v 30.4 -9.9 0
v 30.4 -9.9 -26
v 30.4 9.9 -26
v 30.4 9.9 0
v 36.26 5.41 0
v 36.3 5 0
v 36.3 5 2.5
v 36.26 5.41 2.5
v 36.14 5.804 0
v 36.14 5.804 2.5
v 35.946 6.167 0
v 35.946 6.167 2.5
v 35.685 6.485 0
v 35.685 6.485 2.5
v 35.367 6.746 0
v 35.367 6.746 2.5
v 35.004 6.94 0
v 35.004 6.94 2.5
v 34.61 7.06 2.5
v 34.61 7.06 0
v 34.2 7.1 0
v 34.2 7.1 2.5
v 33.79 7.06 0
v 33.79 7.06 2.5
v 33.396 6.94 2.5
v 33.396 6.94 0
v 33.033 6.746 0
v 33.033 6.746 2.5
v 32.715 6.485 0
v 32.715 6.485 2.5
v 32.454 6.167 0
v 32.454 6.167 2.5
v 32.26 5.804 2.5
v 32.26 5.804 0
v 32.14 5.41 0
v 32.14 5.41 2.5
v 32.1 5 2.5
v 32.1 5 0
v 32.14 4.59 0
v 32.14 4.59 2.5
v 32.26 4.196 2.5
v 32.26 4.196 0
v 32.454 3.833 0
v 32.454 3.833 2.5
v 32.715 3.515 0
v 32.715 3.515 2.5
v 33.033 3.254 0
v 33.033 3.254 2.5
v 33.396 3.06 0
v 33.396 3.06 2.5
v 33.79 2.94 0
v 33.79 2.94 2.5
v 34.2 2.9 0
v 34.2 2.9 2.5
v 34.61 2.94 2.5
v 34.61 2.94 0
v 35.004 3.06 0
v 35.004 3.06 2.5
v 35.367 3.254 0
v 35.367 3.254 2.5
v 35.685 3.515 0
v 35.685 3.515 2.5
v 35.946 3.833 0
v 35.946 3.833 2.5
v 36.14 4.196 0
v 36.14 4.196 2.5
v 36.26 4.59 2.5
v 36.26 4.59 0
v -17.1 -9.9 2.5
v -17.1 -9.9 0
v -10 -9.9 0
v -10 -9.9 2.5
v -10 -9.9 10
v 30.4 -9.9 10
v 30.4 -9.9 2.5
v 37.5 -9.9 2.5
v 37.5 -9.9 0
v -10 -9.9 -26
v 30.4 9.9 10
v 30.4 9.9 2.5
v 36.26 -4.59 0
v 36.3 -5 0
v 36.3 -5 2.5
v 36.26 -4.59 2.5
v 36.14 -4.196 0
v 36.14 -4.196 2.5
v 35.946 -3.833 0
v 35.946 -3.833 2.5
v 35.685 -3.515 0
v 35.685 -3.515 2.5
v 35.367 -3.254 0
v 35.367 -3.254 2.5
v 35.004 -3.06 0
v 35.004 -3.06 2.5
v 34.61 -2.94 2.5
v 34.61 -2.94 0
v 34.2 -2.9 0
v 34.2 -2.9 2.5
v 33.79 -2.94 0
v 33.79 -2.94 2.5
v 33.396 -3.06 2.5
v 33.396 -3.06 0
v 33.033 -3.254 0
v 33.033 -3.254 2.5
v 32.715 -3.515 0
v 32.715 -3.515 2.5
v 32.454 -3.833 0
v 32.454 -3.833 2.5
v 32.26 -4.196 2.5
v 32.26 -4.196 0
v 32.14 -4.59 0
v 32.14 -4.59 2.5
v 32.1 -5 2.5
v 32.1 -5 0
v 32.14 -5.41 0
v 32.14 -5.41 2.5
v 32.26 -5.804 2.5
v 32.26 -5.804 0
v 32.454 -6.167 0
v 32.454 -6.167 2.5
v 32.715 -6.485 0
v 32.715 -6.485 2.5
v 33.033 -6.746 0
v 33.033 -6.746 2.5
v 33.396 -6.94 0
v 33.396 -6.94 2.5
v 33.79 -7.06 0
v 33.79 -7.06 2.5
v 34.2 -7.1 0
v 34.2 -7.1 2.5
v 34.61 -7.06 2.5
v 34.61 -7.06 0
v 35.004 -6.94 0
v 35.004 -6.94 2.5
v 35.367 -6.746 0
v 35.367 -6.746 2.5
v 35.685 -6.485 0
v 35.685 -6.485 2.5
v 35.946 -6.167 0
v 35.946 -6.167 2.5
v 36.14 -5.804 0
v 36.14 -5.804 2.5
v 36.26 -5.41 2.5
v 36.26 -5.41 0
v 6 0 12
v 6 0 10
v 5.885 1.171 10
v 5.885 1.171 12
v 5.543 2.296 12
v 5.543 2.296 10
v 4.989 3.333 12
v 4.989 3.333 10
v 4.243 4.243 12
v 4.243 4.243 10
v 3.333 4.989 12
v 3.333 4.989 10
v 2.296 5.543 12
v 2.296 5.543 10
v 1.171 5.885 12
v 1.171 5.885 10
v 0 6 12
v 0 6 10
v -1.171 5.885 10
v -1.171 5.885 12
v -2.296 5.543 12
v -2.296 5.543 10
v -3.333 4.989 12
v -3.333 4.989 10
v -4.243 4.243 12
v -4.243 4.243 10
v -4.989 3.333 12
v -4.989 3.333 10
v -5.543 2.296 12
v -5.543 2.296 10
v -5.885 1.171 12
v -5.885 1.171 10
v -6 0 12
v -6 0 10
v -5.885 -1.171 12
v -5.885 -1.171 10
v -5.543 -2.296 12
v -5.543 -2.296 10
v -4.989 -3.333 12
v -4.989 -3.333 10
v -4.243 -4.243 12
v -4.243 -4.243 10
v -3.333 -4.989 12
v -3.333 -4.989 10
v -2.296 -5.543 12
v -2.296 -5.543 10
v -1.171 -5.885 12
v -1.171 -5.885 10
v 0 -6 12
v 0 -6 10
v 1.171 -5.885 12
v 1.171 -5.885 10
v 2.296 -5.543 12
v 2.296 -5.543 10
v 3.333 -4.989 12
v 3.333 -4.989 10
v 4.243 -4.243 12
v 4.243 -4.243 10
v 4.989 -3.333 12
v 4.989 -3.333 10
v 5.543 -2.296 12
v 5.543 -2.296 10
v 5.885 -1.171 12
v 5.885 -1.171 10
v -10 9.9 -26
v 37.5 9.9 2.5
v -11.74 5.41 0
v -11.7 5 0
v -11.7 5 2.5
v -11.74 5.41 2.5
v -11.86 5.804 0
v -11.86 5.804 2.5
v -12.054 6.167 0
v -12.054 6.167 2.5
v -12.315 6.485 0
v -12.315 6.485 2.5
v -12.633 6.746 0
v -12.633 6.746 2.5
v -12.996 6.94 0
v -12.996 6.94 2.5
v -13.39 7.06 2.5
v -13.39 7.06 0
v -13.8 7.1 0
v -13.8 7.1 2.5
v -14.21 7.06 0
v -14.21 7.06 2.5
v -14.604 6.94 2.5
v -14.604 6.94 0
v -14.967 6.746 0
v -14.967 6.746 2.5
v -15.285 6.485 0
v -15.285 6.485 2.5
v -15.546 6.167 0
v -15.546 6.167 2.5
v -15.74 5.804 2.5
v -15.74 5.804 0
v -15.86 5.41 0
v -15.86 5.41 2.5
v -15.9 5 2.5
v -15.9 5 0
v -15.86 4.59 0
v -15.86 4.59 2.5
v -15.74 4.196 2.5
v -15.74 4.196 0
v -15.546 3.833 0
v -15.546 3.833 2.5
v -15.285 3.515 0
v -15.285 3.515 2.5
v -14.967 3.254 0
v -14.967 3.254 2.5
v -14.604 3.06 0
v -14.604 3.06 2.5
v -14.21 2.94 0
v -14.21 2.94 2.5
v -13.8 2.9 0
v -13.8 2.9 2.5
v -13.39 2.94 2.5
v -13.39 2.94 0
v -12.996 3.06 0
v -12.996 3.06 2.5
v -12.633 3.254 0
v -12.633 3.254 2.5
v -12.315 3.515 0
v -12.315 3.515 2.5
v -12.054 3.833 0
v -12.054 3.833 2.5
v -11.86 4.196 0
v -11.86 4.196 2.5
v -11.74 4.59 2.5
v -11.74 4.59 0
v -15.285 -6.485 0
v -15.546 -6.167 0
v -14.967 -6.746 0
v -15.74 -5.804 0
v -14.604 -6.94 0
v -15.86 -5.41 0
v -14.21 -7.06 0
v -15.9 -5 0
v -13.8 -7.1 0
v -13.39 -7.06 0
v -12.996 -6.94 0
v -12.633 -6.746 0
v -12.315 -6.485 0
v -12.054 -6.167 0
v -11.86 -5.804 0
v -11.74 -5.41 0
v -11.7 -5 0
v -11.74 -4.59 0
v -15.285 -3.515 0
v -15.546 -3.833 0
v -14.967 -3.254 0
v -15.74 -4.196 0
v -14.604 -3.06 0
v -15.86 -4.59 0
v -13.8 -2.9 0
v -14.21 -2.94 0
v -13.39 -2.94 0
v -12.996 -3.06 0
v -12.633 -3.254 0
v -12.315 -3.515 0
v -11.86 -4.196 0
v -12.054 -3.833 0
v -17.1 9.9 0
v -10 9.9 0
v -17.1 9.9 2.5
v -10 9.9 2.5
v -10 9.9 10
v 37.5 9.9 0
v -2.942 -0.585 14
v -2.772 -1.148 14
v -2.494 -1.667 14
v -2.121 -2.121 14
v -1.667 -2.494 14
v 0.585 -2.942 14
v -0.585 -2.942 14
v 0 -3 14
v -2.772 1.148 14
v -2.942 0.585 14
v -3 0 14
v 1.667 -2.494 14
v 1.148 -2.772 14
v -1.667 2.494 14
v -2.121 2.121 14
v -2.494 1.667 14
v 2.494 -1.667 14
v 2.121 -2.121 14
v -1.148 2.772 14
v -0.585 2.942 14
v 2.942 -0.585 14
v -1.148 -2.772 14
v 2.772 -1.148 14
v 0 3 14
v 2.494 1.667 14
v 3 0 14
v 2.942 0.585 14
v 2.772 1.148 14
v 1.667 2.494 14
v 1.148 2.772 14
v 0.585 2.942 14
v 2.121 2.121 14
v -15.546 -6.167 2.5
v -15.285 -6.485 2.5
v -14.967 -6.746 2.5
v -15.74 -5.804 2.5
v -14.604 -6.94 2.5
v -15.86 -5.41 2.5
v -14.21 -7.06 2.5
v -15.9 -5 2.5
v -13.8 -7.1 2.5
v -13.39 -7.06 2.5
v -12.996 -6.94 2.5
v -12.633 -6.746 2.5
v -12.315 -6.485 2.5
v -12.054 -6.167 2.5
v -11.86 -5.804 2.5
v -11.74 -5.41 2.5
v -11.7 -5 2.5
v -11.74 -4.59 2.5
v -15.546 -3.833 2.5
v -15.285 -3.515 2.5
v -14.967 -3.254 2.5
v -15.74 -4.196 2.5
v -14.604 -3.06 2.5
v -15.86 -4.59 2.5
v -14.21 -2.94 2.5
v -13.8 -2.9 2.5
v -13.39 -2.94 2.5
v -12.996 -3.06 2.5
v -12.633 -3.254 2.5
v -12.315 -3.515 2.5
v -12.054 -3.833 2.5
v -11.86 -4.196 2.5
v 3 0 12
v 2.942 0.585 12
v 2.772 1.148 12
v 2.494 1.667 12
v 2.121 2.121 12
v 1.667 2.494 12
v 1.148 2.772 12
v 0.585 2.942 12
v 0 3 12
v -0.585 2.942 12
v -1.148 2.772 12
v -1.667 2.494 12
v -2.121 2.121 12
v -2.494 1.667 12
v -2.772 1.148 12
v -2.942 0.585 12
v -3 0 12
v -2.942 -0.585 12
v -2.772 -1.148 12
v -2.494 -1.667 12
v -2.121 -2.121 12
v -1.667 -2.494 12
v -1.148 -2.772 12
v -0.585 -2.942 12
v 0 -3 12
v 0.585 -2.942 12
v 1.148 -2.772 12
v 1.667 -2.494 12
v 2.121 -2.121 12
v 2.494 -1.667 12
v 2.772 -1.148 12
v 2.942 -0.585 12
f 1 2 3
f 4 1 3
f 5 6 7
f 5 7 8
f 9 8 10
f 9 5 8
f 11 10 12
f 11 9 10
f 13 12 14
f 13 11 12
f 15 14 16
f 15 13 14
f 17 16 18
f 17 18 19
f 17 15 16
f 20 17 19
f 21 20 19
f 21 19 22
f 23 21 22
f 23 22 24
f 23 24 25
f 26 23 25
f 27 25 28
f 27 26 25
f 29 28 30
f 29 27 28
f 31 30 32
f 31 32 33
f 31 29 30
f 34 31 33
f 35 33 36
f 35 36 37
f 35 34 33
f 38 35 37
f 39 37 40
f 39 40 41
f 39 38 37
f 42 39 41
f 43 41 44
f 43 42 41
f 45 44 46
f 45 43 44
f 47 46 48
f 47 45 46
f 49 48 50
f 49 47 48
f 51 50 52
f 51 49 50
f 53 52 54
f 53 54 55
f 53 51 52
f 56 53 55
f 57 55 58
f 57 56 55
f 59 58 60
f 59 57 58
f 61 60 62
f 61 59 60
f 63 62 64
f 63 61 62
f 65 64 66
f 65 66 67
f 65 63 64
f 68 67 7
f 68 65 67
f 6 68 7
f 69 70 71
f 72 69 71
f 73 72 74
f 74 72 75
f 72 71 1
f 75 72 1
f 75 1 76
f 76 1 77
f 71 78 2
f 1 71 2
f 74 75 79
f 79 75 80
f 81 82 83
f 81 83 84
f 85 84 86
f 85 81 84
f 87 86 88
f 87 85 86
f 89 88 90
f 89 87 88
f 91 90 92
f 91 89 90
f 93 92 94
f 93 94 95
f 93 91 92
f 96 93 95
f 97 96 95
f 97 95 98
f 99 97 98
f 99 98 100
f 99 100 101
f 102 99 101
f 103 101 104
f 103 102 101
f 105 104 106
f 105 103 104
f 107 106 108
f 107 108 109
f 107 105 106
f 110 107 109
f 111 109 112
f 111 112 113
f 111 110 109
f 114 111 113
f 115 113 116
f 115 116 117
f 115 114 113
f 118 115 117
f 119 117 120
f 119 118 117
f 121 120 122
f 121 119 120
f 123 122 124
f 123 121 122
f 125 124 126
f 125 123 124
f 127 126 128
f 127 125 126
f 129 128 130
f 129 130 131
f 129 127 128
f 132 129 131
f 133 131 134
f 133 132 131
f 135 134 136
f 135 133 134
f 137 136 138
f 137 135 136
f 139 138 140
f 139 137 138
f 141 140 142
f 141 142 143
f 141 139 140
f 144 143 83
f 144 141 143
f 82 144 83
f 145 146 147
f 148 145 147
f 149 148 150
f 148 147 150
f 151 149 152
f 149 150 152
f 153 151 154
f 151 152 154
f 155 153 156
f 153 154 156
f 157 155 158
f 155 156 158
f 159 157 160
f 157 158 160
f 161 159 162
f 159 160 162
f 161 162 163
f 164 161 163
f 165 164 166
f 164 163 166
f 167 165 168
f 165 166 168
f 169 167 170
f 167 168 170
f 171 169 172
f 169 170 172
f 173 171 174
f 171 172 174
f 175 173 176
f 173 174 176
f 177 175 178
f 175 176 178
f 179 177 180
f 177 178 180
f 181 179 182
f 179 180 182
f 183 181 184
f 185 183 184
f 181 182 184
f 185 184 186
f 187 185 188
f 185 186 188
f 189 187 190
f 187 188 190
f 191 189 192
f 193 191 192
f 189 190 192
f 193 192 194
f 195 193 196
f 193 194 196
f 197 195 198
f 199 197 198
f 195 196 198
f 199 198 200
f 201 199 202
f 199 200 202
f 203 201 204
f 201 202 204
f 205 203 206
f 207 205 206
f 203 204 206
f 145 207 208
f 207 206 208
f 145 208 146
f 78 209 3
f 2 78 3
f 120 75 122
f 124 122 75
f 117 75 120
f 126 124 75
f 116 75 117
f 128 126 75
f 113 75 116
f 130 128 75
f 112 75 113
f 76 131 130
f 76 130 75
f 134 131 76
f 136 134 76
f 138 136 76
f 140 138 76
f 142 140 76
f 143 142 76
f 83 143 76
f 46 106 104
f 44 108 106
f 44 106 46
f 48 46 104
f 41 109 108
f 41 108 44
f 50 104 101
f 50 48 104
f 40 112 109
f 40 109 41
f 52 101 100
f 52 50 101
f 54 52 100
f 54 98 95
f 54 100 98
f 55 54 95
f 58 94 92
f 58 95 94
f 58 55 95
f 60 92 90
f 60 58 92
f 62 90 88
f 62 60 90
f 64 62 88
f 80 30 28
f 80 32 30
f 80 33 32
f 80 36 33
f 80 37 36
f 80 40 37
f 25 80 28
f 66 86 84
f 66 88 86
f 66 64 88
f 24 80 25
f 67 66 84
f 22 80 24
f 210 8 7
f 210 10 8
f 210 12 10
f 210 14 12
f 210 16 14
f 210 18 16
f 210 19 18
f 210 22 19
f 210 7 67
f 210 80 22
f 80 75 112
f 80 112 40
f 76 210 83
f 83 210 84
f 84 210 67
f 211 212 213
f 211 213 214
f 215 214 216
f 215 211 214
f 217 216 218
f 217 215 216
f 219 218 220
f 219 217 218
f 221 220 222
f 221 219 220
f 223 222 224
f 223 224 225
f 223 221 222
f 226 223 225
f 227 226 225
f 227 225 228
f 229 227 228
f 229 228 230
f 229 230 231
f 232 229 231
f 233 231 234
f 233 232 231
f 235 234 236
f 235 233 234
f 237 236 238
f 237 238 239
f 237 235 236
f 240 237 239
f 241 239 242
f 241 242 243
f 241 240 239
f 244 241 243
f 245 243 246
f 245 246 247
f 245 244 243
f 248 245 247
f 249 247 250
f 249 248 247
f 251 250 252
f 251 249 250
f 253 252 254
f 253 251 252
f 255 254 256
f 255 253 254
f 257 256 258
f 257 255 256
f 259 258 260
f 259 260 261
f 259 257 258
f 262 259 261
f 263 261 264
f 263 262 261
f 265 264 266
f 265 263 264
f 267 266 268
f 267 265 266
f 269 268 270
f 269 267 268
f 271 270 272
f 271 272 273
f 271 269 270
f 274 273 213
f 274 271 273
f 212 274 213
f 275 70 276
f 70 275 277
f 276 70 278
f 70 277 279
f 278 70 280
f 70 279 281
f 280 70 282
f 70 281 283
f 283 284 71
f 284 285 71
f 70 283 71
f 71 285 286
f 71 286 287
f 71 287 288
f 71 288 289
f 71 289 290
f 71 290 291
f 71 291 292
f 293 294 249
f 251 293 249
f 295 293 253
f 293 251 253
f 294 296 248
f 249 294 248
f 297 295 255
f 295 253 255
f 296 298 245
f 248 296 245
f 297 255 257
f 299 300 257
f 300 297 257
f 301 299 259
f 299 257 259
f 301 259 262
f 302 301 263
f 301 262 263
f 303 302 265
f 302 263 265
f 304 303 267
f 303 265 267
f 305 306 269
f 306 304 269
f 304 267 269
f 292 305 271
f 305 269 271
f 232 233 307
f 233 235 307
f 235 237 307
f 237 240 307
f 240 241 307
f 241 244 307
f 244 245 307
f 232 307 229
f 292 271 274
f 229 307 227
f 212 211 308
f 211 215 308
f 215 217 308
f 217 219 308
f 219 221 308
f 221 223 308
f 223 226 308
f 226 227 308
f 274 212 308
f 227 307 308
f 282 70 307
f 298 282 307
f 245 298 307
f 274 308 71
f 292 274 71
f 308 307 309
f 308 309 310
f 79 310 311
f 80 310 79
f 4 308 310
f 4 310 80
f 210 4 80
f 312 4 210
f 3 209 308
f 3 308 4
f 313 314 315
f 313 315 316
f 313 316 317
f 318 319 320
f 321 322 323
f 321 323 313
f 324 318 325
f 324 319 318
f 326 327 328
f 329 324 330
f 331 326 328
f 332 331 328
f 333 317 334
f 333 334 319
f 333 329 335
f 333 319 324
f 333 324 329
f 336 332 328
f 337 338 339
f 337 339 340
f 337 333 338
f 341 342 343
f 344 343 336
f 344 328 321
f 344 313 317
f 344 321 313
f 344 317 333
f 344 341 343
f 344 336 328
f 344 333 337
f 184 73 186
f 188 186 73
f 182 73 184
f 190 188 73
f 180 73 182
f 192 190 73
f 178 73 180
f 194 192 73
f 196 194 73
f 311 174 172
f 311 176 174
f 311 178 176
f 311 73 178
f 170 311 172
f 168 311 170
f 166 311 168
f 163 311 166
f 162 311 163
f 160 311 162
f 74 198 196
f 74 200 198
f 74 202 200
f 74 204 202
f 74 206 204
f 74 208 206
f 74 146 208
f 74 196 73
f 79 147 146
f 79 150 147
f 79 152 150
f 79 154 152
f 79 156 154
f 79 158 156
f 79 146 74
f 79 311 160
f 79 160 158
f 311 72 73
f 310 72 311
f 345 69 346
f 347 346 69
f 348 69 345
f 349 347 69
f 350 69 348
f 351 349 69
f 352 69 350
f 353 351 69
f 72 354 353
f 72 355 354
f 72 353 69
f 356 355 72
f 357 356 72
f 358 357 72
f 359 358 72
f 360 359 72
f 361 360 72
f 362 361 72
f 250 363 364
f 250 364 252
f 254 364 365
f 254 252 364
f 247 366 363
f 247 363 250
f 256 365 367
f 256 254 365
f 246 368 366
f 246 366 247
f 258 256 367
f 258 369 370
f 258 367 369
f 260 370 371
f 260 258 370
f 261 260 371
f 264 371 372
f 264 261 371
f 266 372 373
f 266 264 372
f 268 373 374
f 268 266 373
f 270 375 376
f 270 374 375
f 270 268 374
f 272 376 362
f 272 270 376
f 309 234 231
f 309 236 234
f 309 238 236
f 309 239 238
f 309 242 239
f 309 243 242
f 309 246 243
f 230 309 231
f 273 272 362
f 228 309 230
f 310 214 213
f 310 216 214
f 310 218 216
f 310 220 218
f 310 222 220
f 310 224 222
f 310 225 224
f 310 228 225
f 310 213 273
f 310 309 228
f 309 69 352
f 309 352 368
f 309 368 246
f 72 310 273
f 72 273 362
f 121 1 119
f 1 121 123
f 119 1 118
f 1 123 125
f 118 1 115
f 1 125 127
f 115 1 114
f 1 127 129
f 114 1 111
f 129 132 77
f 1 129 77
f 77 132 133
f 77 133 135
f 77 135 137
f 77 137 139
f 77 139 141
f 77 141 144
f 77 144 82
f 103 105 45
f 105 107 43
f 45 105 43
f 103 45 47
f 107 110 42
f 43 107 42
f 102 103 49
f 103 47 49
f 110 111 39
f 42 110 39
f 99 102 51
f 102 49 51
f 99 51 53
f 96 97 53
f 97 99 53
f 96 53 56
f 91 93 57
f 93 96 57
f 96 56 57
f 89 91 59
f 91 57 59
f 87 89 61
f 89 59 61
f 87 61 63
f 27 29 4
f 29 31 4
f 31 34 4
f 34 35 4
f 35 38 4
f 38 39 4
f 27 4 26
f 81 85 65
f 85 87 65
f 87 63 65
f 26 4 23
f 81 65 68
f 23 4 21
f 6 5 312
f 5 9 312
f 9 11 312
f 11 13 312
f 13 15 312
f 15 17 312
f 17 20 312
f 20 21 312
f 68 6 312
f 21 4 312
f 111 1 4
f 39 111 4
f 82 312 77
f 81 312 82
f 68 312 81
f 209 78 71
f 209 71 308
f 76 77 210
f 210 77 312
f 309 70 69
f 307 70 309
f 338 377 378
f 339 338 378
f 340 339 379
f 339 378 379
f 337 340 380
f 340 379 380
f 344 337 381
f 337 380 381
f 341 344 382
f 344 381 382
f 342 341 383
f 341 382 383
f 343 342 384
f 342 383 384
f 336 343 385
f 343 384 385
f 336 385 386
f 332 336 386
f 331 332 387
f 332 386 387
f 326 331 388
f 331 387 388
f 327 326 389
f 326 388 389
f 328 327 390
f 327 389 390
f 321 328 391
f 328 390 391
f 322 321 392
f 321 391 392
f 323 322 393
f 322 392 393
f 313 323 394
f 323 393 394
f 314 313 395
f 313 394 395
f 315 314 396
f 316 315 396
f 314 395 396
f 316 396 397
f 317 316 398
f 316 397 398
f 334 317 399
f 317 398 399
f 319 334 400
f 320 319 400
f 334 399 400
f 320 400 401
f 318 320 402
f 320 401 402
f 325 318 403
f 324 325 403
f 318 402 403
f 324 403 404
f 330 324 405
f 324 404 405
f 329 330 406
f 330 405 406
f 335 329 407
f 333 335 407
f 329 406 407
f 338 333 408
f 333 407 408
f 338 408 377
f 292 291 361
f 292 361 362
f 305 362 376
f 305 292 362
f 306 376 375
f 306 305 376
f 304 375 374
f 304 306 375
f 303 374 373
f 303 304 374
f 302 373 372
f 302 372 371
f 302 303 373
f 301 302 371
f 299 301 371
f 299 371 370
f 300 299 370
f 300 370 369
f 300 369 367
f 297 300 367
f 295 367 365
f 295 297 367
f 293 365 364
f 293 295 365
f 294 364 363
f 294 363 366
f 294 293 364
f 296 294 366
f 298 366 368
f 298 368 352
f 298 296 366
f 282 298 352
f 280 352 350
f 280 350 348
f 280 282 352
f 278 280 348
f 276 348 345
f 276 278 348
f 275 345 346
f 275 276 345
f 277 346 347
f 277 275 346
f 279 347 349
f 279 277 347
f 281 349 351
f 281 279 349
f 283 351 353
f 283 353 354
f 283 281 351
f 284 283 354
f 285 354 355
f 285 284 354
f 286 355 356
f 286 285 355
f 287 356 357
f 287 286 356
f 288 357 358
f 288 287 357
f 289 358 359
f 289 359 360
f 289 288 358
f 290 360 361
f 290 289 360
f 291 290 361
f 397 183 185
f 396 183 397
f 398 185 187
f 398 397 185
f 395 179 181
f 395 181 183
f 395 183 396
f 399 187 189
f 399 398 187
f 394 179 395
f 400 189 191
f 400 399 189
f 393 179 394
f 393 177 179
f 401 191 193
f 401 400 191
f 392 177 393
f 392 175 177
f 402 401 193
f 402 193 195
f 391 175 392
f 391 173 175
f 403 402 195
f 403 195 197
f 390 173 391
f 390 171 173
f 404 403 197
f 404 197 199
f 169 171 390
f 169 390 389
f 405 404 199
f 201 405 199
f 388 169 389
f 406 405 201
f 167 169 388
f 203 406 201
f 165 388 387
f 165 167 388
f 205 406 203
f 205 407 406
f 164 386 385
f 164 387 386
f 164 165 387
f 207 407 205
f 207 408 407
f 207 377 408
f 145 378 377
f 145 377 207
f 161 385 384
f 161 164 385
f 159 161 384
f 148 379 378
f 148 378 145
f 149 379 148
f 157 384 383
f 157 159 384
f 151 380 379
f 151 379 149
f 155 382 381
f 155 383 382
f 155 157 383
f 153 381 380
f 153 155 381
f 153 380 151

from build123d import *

# Parameters (mm, degrees)
BOSS_EXTRUDE1_DEPTH      = 10
BOSS_EXTRUDE1_DEPTH_BACK = 26
SKETCH1_W                = 40.4
SKETCH1_H                = 19.8
SKETCH2_W                = 7.1
SKETCH2_H                = 19.8
SKETCH2_R                = 2.1
BOSS_EXTRUDE2_DEPTH      = 2.5
SKETCH3_W                = 7.1
SKETCH3_H                = 19.8
SKETCH3_R                = 2.1
BOSS_EXTRUDE3_DEPTH      = 2.5
BOSS_EXTRUDE4_START      = 10
SKETCH4_R                = 6
BOSS_EXTRUDE4_DEPTH      = 2
BOSS_EXTRUDE5_START      = 12
SKETCH5_R                = 3
BOSS_EXTRUDE5_DEPTH      = 2


with BuildPart() as part:
    # Sketch1 → Boss-Extrude1 (new, two sides: drawn at the far end of the back side and taken through both)
    with BuildSketch(Plane.XY.offset(-BOSS_EXTRUDE1_DEPTH_BACK)):
        with Locations((10.2, 0)):
            Rectangle(SKETCH1_W, SKETCH1_H)
    extrude(amount=BOSS_EXTRUDE1_DEPTH + BOSS_EXTRUDE1_DEPTH_BACK)

    # Sketch2 → Boss-Extrude2 (add)
    with BuildSketch(Plane.XY):
        with Locations((-13.55, 0)):
            Rectangle(SKETCH2_W, SKETCH2_H)
        with Locations((-13.8, 5)):
            Circle(SKETCH2_R, mode=Mode.SUBTRACT)
        with Locations((-13.8, -5)):
            Circle(SKETCH2_R, mode=Mode.SUBTRACT)
    extrude(amount=BOSS_EXTRUDE2_DEPTH)

    # Sketch3 → Boss-Extrude3 (add)
    with BuildSketch(Plane.XY):
        with Locations((33.95, 0)):
            Rectangle(SKETCH3_W, SKETCH3_H)
        with Locations((34.2, 5)):
            Circle(SKETCH3_R, mode=Mode.SUBTRACT)
        with Locations((34.2, -5)):
            Circle(SKETCH3_R, mode=Mode.SUBTRACT)
    extrude(amount=BOSS_EXTRUDE3_DEPTH)

    # Sketch4 → Boss-Extrude4 (add)
    with BuildSketch(Plane.XY.offset(BOSS_EXTRUDE4_START)):
        Circle(SKETCH4_R)
    extrude(amount=BOSS_EXTRUDE4_DEPTH)

    # Sketch5 → Boss-Extrude5 (add)
    with BuildSketch(Plane.XY.offset(BOSS_EXTRUDE5_START)):
        Circle(SKETCH5_R)
    extrude(amount=BOSS_EXTRUDE5_DEPTH)


solid = part.part
